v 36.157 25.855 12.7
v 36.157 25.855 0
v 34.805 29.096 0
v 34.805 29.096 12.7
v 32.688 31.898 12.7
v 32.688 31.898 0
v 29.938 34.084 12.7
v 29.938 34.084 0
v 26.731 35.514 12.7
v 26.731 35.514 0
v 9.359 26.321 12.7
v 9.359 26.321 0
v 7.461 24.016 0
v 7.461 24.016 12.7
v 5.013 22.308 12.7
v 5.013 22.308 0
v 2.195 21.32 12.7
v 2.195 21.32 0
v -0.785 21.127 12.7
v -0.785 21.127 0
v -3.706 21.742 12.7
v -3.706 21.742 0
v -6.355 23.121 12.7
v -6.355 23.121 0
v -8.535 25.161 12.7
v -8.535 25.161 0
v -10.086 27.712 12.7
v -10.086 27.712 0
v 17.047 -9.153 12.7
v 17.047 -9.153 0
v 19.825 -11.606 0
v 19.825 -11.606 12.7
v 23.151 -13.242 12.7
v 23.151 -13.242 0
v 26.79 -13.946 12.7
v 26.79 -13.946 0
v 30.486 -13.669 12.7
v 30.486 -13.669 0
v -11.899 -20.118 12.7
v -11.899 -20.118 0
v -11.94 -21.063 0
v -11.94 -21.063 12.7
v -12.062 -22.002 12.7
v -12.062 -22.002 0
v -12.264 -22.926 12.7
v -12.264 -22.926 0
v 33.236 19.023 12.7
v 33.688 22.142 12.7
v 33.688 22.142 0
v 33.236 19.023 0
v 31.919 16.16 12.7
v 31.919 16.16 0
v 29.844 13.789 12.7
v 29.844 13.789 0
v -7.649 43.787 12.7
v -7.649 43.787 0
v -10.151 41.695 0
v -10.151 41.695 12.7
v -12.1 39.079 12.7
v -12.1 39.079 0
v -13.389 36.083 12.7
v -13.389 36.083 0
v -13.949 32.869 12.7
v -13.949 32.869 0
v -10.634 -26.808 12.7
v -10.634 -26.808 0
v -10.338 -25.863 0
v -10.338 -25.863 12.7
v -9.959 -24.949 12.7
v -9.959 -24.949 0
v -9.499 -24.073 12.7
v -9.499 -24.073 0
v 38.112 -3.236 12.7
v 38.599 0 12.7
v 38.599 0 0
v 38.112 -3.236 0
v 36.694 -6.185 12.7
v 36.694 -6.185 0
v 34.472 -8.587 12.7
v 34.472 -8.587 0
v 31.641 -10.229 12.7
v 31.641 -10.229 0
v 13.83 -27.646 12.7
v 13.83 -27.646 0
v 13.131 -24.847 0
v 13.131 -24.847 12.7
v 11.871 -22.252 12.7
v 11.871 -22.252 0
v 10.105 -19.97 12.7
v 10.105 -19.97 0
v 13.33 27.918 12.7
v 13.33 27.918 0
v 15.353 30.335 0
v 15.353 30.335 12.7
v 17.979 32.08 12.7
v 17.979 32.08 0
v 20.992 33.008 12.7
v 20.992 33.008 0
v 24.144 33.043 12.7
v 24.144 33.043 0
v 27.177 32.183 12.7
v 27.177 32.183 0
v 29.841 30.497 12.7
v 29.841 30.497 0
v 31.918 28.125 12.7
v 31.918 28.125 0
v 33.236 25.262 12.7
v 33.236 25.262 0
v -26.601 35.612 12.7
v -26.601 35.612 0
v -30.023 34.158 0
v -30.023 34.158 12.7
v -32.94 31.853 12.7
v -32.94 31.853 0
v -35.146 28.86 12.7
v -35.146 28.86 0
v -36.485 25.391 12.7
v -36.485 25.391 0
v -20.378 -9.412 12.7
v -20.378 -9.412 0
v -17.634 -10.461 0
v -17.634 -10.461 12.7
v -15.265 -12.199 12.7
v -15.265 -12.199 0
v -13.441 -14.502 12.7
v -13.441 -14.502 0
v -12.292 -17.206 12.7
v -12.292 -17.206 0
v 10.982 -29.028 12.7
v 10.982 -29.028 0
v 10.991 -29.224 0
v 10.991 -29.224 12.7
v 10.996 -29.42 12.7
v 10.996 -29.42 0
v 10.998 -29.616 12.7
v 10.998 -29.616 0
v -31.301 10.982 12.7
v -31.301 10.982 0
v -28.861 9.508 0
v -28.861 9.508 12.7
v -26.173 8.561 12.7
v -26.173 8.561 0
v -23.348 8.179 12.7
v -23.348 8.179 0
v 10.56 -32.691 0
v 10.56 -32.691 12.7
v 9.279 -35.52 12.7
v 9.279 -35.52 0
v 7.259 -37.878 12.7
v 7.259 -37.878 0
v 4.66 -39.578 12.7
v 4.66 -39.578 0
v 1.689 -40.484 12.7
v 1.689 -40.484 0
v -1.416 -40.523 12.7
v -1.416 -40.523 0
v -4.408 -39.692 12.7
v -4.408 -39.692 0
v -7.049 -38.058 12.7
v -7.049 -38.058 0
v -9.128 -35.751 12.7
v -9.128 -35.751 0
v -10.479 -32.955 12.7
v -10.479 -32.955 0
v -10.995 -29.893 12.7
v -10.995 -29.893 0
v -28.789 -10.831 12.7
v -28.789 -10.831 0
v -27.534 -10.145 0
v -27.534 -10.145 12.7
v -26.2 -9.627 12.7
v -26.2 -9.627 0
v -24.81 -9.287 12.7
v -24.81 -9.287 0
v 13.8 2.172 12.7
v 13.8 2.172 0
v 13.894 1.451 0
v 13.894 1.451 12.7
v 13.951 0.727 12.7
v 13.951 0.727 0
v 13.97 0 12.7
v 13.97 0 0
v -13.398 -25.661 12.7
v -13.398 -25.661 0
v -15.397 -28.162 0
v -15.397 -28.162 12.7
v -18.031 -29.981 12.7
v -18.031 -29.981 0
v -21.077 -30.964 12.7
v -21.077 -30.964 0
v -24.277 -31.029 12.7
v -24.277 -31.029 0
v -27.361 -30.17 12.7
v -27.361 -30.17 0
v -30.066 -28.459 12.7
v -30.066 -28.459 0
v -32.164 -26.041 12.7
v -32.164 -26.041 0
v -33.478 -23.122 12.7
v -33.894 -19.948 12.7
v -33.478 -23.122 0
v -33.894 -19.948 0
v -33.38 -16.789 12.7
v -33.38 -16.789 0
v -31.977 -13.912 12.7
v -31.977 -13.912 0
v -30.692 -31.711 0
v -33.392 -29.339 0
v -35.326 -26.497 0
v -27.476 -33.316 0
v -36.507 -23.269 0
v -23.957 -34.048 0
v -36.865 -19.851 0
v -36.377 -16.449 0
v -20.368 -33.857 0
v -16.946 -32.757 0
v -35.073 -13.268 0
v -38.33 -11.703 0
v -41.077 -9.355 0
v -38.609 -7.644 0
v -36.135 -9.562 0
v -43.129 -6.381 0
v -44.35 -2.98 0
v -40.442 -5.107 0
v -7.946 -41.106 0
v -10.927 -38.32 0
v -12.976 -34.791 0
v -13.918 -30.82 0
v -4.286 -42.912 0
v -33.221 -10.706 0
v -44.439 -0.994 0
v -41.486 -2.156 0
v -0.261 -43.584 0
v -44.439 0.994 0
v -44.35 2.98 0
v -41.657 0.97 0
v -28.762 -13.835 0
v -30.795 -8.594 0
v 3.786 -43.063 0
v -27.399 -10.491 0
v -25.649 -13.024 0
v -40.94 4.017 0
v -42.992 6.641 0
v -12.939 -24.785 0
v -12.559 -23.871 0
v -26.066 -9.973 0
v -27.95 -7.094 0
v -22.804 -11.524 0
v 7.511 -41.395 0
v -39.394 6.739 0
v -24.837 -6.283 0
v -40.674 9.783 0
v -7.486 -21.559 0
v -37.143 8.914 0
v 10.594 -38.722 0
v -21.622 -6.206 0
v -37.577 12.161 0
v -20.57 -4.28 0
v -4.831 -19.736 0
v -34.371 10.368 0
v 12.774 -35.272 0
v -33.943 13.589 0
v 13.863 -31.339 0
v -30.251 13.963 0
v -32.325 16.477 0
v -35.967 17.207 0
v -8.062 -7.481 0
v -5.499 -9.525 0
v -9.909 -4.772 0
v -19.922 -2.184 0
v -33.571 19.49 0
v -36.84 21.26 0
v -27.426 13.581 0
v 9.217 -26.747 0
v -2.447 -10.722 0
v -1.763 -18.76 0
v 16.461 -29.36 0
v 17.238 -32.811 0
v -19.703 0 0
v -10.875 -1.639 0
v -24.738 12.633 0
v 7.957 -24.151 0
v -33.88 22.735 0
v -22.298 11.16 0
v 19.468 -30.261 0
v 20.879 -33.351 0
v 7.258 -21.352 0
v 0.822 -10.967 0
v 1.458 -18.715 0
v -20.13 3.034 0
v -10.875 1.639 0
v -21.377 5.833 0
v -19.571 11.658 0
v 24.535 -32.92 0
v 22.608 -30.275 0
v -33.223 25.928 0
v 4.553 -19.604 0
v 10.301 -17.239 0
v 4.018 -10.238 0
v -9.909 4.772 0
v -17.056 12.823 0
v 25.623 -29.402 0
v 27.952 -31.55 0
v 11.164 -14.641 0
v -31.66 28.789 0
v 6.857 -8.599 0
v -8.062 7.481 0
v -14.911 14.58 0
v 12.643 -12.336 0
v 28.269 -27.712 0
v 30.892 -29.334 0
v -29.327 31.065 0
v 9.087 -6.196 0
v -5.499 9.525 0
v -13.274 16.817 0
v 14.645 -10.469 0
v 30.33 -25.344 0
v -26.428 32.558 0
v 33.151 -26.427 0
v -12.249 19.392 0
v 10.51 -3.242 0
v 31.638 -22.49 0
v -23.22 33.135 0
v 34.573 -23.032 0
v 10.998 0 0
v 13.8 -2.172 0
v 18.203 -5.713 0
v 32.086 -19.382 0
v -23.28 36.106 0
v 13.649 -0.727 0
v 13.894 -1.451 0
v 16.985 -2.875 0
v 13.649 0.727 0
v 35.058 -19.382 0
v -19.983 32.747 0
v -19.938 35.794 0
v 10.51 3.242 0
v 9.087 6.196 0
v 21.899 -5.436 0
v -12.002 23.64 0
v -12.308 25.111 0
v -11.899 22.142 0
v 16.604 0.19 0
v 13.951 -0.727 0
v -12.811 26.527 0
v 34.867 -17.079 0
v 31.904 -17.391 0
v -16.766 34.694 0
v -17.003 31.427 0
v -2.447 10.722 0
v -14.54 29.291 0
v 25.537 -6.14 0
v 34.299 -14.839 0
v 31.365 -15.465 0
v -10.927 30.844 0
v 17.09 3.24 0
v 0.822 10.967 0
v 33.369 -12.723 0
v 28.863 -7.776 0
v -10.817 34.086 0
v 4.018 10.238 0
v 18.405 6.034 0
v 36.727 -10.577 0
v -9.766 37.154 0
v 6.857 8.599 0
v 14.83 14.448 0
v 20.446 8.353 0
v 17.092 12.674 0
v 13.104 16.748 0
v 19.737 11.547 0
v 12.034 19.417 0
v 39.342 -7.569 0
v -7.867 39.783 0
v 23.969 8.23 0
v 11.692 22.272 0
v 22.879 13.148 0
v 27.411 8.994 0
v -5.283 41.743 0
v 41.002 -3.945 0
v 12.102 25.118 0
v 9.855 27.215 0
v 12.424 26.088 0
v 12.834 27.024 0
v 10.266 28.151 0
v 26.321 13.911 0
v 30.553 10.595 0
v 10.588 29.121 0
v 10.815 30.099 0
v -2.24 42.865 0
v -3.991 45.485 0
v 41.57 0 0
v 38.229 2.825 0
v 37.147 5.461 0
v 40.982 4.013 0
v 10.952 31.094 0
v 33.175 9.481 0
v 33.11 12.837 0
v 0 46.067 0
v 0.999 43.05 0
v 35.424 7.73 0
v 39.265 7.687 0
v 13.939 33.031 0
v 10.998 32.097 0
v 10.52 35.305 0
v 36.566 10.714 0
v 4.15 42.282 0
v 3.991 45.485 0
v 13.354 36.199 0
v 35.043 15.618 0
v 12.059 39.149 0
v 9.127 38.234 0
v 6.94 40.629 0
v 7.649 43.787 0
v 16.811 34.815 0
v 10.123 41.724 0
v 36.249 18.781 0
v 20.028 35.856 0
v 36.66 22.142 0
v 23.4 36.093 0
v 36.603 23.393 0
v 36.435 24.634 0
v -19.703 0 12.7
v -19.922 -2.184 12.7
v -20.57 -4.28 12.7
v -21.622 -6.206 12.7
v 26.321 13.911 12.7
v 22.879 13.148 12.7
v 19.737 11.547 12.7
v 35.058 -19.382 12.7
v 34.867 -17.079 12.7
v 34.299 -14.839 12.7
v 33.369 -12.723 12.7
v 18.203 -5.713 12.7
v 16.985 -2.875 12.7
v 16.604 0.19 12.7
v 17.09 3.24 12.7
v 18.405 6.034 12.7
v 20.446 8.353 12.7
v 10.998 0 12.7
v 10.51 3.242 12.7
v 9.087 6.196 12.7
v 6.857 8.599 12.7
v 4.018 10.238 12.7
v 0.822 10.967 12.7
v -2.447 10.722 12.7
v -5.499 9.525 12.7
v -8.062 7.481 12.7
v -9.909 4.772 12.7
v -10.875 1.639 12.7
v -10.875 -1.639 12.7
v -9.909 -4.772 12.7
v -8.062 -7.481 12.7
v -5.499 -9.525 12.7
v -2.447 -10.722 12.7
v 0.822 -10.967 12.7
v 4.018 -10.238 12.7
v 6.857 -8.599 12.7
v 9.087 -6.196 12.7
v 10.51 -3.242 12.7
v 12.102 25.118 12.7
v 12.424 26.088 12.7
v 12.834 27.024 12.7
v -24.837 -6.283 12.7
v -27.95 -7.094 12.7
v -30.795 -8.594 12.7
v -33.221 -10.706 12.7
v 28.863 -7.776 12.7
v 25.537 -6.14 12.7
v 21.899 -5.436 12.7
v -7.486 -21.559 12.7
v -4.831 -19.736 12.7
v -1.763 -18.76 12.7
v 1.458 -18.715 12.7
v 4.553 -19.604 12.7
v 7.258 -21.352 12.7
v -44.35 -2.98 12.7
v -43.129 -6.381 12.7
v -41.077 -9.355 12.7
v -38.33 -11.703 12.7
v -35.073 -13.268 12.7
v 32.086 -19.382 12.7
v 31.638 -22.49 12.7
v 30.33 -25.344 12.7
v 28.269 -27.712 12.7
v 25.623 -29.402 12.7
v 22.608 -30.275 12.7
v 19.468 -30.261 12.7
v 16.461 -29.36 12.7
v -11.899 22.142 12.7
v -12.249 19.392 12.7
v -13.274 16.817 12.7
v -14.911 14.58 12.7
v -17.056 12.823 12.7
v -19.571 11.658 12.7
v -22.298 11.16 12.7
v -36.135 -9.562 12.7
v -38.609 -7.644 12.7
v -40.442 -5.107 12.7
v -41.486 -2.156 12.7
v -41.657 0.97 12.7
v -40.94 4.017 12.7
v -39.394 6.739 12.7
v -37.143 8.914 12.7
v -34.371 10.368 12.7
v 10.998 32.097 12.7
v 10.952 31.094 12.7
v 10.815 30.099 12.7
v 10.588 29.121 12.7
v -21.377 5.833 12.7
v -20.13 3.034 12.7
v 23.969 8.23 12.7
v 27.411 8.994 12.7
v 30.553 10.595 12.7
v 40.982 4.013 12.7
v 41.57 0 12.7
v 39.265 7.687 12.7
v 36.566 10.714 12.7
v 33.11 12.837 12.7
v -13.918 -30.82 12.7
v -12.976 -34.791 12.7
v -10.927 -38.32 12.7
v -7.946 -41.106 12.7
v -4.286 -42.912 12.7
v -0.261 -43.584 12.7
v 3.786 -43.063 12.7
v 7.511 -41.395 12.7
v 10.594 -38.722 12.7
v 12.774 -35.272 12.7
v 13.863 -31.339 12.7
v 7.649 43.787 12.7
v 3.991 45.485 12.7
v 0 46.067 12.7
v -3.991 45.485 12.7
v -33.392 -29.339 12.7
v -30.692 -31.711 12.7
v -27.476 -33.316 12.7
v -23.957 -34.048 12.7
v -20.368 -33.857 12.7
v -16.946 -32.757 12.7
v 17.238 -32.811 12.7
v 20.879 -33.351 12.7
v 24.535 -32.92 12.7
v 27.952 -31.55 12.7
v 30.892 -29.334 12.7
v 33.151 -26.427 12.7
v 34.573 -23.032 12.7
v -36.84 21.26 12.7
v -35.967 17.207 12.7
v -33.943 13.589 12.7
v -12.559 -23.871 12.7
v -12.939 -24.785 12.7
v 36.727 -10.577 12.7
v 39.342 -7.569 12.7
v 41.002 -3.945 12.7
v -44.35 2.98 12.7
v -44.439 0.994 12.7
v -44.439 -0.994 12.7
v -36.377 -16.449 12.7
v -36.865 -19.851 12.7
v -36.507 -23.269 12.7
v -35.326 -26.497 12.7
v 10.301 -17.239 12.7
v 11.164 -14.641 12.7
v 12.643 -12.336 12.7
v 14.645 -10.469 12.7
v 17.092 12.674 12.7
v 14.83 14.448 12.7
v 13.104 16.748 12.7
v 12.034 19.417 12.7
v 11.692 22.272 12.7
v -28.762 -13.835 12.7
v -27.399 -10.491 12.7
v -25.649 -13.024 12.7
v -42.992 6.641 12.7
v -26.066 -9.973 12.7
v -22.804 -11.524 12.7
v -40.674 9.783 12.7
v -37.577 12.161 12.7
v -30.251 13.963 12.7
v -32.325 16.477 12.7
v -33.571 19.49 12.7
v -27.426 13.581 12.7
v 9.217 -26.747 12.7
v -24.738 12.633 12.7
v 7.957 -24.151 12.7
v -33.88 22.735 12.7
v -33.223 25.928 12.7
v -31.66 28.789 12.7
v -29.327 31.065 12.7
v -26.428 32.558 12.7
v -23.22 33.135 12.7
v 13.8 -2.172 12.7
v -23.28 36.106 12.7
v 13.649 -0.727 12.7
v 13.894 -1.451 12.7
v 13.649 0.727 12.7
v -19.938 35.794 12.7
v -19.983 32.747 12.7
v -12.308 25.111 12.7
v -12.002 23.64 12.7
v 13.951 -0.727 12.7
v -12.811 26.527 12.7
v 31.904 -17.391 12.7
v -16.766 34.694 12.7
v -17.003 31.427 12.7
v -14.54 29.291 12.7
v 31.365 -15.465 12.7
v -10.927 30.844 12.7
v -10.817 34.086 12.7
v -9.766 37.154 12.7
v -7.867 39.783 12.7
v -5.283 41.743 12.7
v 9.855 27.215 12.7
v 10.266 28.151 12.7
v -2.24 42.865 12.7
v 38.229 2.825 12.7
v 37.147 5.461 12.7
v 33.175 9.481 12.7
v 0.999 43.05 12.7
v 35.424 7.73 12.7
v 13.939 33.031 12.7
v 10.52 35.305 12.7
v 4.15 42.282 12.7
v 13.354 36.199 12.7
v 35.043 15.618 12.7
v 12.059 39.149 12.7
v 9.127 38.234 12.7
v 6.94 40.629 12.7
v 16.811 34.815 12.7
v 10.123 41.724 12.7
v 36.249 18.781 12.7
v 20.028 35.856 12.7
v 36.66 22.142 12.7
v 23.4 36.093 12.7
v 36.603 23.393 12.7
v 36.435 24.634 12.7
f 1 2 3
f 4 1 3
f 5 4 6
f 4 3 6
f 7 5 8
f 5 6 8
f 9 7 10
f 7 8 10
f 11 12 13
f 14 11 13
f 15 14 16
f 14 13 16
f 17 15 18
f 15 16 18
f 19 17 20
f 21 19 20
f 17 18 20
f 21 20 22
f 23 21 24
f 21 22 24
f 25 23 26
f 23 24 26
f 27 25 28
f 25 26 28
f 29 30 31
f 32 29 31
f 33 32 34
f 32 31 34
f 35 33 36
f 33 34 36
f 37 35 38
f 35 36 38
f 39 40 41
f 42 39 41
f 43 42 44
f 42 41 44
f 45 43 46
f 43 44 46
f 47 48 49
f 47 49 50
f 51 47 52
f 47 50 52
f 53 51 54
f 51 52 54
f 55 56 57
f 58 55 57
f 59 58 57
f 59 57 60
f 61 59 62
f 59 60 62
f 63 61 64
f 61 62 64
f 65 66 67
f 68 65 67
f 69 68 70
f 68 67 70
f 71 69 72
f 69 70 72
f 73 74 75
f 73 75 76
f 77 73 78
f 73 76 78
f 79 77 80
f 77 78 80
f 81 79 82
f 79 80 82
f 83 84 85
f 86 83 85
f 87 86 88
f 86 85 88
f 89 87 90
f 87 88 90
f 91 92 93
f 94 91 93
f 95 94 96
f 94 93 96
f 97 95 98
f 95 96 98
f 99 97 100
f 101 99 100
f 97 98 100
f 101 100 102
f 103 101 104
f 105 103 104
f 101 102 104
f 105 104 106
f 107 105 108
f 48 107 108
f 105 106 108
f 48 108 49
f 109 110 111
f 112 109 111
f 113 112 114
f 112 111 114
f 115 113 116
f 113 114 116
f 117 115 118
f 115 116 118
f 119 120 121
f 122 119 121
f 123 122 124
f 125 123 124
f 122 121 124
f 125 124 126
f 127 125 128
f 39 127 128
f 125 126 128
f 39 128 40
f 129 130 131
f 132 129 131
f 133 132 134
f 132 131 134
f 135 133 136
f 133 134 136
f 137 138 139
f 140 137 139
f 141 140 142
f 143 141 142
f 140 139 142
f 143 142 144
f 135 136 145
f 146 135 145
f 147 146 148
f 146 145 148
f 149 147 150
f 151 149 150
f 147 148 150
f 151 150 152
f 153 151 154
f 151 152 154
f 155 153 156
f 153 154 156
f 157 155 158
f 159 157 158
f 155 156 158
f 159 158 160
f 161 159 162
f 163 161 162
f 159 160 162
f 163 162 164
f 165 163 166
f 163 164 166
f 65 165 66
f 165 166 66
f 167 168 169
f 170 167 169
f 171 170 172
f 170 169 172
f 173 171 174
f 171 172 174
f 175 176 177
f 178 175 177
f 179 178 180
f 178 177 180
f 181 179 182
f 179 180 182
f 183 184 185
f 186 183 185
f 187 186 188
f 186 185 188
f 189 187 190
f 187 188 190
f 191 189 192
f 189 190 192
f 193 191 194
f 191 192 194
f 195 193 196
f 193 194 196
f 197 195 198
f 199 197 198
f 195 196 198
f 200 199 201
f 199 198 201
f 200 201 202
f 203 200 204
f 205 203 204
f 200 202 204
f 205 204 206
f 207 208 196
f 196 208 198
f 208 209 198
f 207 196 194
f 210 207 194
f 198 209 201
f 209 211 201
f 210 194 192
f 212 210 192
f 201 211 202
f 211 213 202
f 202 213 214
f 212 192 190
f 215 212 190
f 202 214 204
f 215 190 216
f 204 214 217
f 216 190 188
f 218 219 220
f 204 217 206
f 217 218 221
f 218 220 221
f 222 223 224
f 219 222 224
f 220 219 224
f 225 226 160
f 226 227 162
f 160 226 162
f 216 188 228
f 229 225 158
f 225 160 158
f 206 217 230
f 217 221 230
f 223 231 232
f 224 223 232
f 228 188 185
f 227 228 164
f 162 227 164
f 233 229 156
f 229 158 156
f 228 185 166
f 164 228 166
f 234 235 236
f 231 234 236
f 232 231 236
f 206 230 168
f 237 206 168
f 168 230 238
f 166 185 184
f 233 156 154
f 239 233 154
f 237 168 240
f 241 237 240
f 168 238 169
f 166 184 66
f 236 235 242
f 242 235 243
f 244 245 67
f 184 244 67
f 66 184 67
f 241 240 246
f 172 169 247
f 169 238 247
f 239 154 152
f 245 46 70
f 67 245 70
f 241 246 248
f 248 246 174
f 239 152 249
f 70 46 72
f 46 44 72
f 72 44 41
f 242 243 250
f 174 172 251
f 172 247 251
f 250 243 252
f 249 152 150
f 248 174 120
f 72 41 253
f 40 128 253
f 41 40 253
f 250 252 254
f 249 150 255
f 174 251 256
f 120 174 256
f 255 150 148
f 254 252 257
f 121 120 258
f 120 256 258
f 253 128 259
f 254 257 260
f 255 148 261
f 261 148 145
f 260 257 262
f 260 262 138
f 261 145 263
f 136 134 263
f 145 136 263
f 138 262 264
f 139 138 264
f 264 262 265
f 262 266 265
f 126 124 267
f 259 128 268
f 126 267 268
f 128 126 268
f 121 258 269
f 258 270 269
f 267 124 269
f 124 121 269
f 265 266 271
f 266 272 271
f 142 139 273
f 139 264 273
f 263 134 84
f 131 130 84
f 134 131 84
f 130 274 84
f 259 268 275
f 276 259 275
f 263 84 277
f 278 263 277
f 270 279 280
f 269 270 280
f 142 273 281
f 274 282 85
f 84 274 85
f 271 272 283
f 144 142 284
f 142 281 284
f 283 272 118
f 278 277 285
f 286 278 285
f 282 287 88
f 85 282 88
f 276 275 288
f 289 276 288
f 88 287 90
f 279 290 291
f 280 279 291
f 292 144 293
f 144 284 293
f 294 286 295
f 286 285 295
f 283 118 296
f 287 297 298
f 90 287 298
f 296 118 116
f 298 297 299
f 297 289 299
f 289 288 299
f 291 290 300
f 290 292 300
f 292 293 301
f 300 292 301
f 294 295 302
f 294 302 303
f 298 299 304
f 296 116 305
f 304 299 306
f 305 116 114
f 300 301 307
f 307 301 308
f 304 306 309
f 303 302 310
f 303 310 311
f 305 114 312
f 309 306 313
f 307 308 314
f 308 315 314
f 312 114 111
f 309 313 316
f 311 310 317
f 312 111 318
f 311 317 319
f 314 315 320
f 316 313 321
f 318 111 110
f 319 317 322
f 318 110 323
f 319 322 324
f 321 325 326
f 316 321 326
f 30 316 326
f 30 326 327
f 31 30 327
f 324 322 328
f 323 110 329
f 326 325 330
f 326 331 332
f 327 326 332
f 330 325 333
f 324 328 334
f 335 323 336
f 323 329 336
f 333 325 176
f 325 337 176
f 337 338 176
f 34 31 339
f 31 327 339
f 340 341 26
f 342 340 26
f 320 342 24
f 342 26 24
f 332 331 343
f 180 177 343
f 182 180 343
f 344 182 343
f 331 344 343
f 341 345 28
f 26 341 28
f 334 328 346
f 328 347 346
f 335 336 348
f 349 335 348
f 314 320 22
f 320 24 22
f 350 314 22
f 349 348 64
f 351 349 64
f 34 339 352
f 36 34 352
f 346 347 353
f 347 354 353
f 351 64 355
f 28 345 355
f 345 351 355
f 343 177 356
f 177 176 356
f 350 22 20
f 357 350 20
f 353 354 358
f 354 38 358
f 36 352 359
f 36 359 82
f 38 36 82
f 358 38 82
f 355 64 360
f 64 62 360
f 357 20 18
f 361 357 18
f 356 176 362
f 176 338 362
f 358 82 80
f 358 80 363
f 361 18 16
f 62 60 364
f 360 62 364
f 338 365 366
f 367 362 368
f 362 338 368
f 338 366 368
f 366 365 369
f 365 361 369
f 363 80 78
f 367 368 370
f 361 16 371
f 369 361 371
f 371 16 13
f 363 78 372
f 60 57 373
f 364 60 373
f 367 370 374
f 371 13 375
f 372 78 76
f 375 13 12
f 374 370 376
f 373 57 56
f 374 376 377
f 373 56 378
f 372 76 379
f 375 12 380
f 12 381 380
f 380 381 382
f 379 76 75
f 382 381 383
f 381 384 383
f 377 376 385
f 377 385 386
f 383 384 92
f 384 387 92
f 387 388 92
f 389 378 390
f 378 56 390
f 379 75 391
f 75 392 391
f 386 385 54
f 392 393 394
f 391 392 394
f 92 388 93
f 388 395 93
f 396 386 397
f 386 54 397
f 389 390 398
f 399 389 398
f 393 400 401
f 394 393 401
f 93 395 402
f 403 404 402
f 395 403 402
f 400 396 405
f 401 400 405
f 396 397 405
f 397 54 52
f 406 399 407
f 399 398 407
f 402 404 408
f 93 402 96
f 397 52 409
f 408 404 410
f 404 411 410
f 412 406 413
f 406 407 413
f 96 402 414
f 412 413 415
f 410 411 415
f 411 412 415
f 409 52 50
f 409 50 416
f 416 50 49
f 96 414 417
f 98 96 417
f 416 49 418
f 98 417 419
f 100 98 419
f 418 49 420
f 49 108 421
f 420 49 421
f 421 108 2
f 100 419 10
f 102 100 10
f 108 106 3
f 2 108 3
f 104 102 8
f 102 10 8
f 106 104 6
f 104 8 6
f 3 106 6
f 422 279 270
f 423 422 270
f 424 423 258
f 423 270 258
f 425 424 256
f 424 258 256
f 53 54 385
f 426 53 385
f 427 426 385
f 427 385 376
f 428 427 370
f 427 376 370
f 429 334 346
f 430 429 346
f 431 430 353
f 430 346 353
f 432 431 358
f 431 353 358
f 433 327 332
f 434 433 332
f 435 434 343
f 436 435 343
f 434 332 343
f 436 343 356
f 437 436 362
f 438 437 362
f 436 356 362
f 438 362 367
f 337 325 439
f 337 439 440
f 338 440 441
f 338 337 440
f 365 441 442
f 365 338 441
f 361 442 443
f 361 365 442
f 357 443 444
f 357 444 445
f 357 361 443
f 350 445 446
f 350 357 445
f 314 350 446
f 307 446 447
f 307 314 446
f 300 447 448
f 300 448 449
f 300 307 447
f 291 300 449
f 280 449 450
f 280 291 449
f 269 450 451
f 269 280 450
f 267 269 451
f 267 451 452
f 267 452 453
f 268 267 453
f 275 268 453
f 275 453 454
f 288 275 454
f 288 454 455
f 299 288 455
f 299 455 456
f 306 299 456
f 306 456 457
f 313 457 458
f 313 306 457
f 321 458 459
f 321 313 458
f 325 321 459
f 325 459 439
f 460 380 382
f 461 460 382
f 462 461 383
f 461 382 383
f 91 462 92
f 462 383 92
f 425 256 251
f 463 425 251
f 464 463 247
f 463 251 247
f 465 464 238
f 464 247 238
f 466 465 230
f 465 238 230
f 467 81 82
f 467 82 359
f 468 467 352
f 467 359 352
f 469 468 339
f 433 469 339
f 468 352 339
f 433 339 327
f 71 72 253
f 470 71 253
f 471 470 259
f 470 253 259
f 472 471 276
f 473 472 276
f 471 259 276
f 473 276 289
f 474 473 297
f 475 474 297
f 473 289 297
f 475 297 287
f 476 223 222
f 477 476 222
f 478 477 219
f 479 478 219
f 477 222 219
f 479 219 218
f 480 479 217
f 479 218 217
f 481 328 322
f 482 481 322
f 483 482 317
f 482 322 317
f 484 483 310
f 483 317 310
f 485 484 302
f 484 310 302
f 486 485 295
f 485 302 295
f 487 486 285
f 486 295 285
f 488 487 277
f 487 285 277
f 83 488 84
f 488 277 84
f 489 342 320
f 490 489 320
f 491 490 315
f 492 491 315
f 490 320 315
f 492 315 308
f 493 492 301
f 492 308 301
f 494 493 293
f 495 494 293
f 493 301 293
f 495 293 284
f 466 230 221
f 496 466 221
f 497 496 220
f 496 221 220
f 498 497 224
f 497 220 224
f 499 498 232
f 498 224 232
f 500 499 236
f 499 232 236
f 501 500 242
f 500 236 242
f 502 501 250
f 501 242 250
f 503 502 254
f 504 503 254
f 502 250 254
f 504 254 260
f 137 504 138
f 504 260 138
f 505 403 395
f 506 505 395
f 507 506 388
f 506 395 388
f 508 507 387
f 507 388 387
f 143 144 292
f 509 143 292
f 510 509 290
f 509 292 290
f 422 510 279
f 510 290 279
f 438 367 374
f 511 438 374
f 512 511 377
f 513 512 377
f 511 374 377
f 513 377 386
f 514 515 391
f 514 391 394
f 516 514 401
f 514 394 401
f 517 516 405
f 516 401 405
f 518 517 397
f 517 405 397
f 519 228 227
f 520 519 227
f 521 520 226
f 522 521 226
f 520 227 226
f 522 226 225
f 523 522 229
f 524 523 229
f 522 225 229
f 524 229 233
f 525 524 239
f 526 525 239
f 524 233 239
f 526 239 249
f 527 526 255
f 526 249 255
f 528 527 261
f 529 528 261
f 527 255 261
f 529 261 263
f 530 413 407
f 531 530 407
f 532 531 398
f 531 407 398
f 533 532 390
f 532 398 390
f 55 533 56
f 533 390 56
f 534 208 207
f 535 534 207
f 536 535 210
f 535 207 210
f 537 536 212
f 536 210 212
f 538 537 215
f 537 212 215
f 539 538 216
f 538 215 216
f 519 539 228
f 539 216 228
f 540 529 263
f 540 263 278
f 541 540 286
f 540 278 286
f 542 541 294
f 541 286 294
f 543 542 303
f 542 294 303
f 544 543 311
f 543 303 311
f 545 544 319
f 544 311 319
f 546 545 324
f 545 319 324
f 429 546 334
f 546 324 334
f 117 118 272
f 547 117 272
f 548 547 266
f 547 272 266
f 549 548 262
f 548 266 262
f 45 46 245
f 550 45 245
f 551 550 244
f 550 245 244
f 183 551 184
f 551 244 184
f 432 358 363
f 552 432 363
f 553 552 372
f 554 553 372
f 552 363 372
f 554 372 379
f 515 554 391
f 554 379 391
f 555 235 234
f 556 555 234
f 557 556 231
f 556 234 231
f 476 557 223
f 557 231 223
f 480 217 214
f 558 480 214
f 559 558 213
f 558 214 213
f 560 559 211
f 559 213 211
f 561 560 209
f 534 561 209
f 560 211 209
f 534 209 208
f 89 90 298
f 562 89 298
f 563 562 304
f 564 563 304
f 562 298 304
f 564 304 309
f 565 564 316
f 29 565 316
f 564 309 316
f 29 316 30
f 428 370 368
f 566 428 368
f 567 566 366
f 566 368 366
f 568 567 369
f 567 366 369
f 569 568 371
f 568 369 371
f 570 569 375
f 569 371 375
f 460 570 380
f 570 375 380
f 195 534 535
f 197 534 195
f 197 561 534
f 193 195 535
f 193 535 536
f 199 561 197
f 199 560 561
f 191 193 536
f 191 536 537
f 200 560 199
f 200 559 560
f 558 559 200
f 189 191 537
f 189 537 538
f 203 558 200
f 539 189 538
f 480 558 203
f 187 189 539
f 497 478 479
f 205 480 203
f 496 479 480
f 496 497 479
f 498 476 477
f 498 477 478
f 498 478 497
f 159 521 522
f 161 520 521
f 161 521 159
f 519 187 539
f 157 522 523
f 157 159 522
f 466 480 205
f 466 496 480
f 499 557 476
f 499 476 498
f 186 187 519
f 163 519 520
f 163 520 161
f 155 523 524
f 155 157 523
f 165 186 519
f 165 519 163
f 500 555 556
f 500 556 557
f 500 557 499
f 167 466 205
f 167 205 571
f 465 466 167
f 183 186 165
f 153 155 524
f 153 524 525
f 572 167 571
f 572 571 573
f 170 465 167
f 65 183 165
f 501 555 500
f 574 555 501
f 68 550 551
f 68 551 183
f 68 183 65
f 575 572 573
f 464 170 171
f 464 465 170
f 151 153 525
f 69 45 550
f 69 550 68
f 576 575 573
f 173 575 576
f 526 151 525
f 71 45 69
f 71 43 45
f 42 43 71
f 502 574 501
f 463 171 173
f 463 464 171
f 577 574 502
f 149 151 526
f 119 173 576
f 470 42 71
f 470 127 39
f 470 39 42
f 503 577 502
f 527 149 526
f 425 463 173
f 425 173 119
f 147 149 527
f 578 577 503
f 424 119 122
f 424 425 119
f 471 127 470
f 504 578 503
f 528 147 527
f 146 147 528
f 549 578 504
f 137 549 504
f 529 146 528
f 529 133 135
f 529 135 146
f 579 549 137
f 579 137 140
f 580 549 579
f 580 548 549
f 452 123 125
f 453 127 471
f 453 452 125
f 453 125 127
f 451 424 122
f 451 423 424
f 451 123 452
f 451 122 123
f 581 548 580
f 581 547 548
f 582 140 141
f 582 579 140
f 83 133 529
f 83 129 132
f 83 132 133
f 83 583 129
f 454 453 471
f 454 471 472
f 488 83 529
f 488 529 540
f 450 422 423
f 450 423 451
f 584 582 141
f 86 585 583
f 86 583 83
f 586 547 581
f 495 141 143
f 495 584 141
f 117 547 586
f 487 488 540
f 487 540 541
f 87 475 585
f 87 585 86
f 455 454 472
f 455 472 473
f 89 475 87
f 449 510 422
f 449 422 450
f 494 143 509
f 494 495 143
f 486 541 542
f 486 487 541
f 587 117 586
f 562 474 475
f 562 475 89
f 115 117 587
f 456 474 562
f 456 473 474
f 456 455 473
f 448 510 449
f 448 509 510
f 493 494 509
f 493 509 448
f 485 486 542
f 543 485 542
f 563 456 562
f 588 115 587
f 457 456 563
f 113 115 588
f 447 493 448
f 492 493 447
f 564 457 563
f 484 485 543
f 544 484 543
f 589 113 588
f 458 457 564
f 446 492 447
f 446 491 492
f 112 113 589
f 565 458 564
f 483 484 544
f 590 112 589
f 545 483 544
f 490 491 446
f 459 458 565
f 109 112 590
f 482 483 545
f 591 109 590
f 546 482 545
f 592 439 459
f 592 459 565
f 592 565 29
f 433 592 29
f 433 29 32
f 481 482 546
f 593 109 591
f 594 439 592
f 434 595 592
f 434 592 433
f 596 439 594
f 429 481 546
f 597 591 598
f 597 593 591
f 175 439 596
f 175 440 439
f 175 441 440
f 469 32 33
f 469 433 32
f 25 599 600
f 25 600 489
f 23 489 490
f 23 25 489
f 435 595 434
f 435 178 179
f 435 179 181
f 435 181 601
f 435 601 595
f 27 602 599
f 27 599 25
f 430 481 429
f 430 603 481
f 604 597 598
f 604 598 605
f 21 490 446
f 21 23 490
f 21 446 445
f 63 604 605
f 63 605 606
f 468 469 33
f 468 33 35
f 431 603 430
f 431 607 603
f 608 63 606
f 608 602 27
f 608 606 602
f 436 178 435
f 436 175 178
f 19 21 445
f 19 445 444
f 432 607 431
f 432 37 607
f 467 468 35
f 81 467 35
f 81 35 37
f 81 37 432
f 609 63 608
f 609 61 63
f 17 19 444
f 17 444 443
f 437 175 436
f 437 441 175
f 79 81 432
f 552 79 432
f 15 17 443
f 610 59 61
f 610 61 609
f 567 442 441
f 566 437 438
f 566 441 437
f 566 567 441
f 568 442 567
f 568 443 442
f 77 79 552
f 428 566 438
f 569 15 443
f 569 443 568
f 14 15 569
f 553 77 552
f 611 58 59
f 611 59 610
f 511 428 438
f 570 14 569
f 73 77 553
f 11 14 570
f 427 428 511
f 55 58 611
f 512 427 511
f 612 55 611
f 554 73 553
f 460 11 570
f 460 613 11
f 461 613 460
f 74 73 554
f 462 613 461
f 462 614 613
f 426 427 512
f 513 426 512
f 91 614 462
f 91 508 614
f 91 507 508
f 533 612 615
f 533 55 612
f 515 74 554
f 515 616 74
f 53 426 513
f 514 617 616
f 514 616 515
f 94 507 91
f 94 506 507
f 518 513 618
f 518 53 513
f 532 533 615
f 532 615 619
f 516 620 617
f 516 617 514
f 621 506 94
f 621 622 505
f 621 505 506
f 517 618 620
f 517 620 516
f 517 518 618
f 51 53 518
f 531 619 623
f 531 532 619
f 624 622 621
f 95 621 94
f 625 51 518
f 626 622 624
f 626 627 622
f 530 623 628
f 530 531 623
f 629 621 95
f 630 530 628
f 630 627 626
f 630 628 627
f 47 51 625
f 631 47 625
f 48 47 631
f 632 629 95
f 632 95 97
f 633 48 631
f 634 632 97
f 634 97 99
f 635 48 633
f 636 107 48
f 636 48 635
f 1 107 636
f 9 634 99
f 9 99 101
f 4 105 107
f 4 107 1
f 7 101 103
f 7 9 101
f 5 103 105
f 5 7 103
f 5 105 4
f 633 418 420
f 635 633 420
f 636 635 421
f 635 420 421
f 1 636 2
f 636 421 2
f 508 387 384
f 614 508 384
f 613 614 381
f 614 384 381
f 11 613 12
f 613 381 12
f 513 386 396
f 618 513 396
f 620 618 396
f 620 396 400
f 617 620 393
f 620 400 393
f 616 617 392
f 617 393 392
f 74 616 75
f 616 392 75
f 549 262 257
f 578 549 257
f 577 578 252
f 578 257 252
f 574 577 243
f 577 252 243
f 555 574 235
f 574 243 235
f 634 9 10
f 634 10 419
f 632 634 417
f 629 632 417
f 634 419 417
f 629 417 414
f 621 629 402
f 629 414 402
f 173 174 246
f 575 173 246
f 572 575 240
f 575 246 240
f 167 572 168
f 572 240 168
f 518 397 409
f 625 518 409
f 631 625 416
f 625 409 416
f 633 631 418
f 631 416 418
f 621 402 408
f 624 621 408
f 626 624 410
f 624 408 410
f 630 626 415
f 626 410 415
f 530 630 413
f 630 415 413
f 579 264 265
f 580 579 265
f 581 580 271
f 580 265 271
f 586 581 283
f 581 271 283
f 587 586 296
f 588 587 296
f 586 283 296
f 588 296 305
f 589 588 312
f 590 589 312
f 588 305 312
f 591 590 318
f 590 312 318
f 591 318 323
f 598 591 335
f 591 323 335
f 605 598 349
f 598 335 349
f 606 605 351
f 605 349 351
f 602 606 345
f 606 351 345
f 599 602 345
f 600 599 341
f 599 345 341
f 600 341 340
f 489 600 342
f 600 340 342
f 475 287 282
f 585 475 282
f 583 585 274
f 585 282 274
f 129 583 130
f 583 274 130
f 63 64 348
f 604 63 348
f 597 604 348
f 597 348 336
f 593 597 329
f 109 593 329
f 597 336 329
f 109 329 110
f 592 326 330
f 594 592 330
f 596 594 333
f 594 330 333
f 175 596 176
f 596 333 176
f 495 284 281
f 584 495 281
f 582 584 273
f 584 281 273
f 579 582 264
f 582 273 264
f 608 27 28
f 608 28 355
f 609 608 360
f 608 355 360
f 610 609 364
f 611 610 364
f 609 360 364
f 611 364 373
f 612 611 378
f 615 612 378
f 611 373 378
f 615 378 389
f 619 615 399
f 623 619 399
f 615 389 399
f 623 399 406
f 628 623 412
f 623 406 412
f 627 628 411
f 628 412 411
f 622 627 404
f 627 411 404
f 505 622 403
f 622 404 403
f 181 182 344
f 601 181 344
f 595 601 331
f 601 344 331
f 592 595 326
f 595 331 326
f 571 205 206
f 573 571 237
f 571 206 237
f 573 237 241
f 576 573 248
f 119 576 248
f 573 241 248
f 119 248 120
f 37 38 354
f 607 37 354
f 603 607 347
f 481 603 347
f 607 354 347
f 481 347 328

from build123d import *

# Parameters (mm, degrees)
F0_R     = 10.9982
F1_DEPTH = 12.7


with BuildPart() as f1:
    # F0 (on Top) → F1 (new body)
    with BuildSketch(Plane.XY):
        with BuildLine():
            ThreePointArc((36.6595053904, 22.1415615255), (36.5332921925, 24.0151855477), (36.1569331676, 25.8549547266))
            ThreePointArc((36.1569331676, 25.8549547266), (31.8126817374, 31.044416256), (26.7309490751, 35.514206475))
            ThreePointArc((26.7309490751, 35.514206475), (20.0275986163, 35.8556109759), (13.9387298404, 33.0312276028))
            ThreePointArc((13.9387298404, 33.0312276028), (13.9621802716, 32.5643943457), (13.97, 32.0970378816))
            ThreePointArc((13.97, 32.0970378816), (13.809120306, 29.9830141416), (13.3301866323, 27.9176809516))
            ThreePointArc((13.3301866323, 27.9176809516), (25.6915666552, 32.7221111995), (33.6877053904, 22.1415615255))
            ThreePointArc((33.6877053904, 22.1415615255), (32.6807162633, 17.5441591575), (29.8441476203, 13.7886280407))
            ThreePointArc((29.8441476203, 13.7886280407), (31.5063251421, 13.4128387201), (33.1103805724, 12.8374624052))
            ThreePointArc((33.1103805724, 12.8374624052), (35.7421014213, 17.1625418576), (36.6595053904, 22.1415615255))
        make_face()
        with BuildLine():
            ThreePointArc((26.7309490751, 35.514206475), (31.8126817374, 31.044416256), (36.1569331676, 25.8549547266))
            ThreePointArc((36.1569331676, 25.8549547266), (32.6877767936, 31.8983780631), (26.7309490751, 35.514206475))
        make_face()
        with BuildLine():
            ThreePointArc((-35.0731566807, -13.2683694138), (-36.7917944171, -21.5711650181), (-33.3923149137, -29.3386401304))
            ThreePointArc((-33.3923149137, -29.3386401304), (-23.9570048726, -34.0476963086), (-13.9180516707, -30.8197396373))
            ThreePointArc((-13.9180516707, -30.8197396373), (-13.8996752079, -28.2161297549), (-13.3984786946, -25.661149487))
            ThreePointArc((-13.3984786946, -25.661149487), (-28.776093154, -29.4132769471), (-31.9773540352, -13.9116184645))
            ThreePointArc((-31.9773540352, -13.9116184645), (-33.5435128628, -13.6778629095), (-35.0731566807, -13.2683694138))
        make_face()
        with BuildLine():
            ThreePointArc((-44.3500050785, 2.9798573019), (-44.45, 0), (-44.3500050785, -2.9798573019))
            ThreePointArc((-44.3500050785, -2.9798573019), (-41.0767090039, -9.3550091876), (-35.0731566807, -13.2683694138))
            ThreePointArc((-35.0731566807, -13.2683694138), (-34.2197857507, -11.9344829162), (-33.2209432758, -10.7057401266))
            ThreePointArc((-33.2209432758, -10.7057401266), (-41.6568779936, 0.9697265091), (-31.3012430481, 10.9818362069))
            ThreePointArc((-31.3012430481, 10.9818362069), (-32.7092505873, 12.1971076688), (-33.9433392044, 13.5886518621))
            ThreePointArc((-33.9433392044, 13.5886518621), (-40.6743431807, 9.7828190024), (-44.3500050785, 2.9798573019))
        make_face()
        with BuildLine():
            ThreePointArc((-33.2209432758, -10.7057401266), (-34.2197857507, -11.9344829162), (-35.0731566807, -13.2683694138))
            ThreePointArc((-35.0731566807, -13.2683694138), (-33.5435128628, -13.6778629095), (-31.9773540352, -13.9116184645))
            ThreePointArc((-31.9773540352, -13.9116184645), (-30.5399313145, -12.2087541474), (-28.7887583748, -10.8305943977))
            ThreePointArc((-28.7887583748, -10.8305943977), (-31.0112079738, -10.9938388171), (-33.2209432758, -10.7057401266))
        make_face()
        with BuildLine():
            ThreePointArc((-13.3984786946, -25.661149487), (-13.8996752079, -28.2161297549), (-13.9180516707, -30.8197396373))
            ThreePointArc((-13.9180516707, -30.8197396373), (-12.0881248548, -28.9675814469), (-10.6336762496, -26.8080209895))
            ThreePointArc((-10.6336762496, -26.8080209895), (-10.15886339, -25.4020923525), (-9.4991085531, -24.0728797514))
            ThreePointArc((-9.4991085531, -24.0728797514), (-9.0712058092, -22.1159428971), (-8.9275872476, -20.1179247995))
            ThreePointArc((-8.9275872476, -20.1179247995), (-8.9405803722, -19.5155469447), (-8.9795355769, -18.9142896011))
            ThreePointArc((-8.9795355769, -18.9142896011), (-10.8094623929, -20.7664477915), (-12.2639109981, -22.9260082489))
            ThreePointArc((-12.2639109981, -22.9260082489), (-12.7387238577, -24.3319368858), (-13.3984786946, -25.661149487))
        make_face()
        with BuildLine():
            ThreePointArc((-10.6336762496, -26.8080209895), (-12.0881248548, -28.9675814469), (-13.9180516707, -30.8197396373))
            ThreePointArc((-13.9180516707, -30.8197396373), (-0.2611307533, -43.5836636648), (13.8633362869, -31.3391270727))
            ThreePointArc((13.8633362869, -31.3391270727), (12.3461913769, -30.279208289), (10.9824672855, -29.0280435884))
            ThreePointArc((10.9824672855, -29.0280435884), (10.9942661178, -29.321968806), (10.9982, -29.6161044389))
            ThreePointArc((10.9982, -29.6161044389), (-1.415822219, -40.5227927852), (-10.6336762496, -26.8080209895))
        make_face()
        with BuildLine():
            ThreePointArc((13.9387298404, 33.0312276028), (12.059390514, 39.1491298005), (7.6490093808, 43.7869290484))
            ThreePointArc((7.6490093808, 43.7869290484), (0, 44.45), (-7.6490093808, 43.7869290484))
            ThreePointArc((-7.6490093808, 43.7869290484), (-12.1002142351, 39.0788510748), (-13.9486559845, 32.8689810311))
            ThreePointArc((-13.9486559845, 32.8689810311), (-11.7159971411, 30.5161028675), (-10.0861193168, 27.7117670386))
            ThreePointArc((-10.0861193168, 27.7117670386), (-2.2395586362, 42.8648036831), (10.9982, 32.0970378816))
            ThreePointArc((10.9982, 32.0970378816), (10.8951364792, 30.594904619), (10.587877522, 29.1209241709))
            ThreePointArc((10.587877522, 29.1209241709), (12.0815696669, 31.2318090297), (13.9387298404, 33.0312276028))
        make_face()
        with BuildLine():
            ThreePointArc((-7.6490093808, 43.7869290484), (0, 44.45), (7.6490093808, 43.7869290484))
            ThreePointArc((7.6490093808, 43.7869290484), (0, 46.0670378816), (-7.6490093808, 43.7869290484))
        make_face()
        with BuildLine():
            ThreePointArc((13.97, 32.0970378816), (13.9621802716, 32.5643943457), (13.9387298404, 33.0312276028))
            ThreePointArc((13.9387298404, 33.0312276028), (12.0815696669, 31.2318090297), (10.587877522, 29.1209241709))
            ThreePointArc((10.587877522, 29.1209241709), (10.0713786475, 27.678018151), (9.3593187581, 26.3209184555))
            ThreePointArc((9.3593187581, 26.3209184555), (8.8173915919, 23.7924275898), (8.7507755499, 21.2073718043))
            ThreePointArc((8.7507755499, 21.2073718043), (10.6079357234, 23.0067903774), (12.1016278684, 25.1176752363))
            ThreePointArc((12.1016278684, 25.1176752363), (12.6181267429, 26.5605812561), (13.3301866323, 27.9176809516))
            ThreePointArc((13.3301866323, 27.9176809516), (13.809120306, 29.9830141416), (13.97, 32.0970378816))
        make_face()
        with BuildLine():
            ThreePointArc((30.5525684391, 10.5945645354), (31.9000019579, 11.6378644155), (33.1103805724, 12.8374624052))
            ThreePointArc((33.1103805724, 12.8374624052), (31.5063251421, 13.4128387201), (29.8441476203, 13.7886280407))
            ThreePointArc((29.8441476203, 13.7886280407), (25.0709576069, 11.4042858664), (19.737284947, 11.5469969902))
            ThreePointArc((19.737284947, 11.5469969902), (18.3898514282, 10.5036971101), (17.1794728138, 9.3040991203))
            ThreePointArc((17.1794728138, 9.3040991203), (18.7835282441, 8.7287228054), (20.4457057658, 8.3529334848))
            ThreePointArc((20.4457057658, 8.3529334848), (25.2188957792, 10.7372756591), (30.5525684391, 10.5945645354))
        make_face()
        with BuildLine():
            ThreePointArc((41.5703479958, 0), (39.2651680779, 7.6871888524), (33.1103805724, 12.8374624052))
            ThreePointArc((33.1103805724, 12.8374624052), (31.9000019579, 11.6378644155), (30.5525684391, 10.5945645354))
            ThreePointArc((30.5525684391, 10.5945645354), (36.3590440779, 6.6517400866), (38.5985479958, 0))
            ThreePointArc((38.5985479958, 0), (36.6944361636, -6.1853022267), (31.6414161677, -10.2288890535))
            ThreePointArc((31.6414161677, -10.2288890535), (32.5730438121, -11.4291217528), (33.3688178772, -12.7234293815))
            ThreePointArc((33.3688178772, -12.7234293815), (39.3422904297, -7.5688630506), (41.5703479958, 0))
        make_face()
        with BuildLine():
            ThreePointArc((-28.7887583748, -10.8305943977), (-30.5399313145, -12.2087541474), (-31.9773540352, -13.9116184645))
            ThreePointArc((-31.9773540352, -13.9116184645), (-25.6492253052, -13.0244114798), (-20.3781564427, -9.4121846728))
            ThreePointArc((-20.3781564427, -9.4121846728), (-22.5878917447, -9.1240859824), (-24.8103413437, -9.2873304017))
            ThreePointArc((-24.8103413437, -9.2873304017), (-26.7239845749, -10.2537639468), (-28.7887583748, -10.8305943977))
        make_face()
        with BuildLine():
            ThreePointArc((-21.6217456833, -6.2063063349), (-27.9498744133, -7.0935133196), (-33.2209432758, -10.7057401266))
            ThreePointArc((-33.2209432758, -10.7057401266), (-31.0112079738, -10.9938388171), (-28.7887583748, -10.8305943977))
            ThreePointArc((-28.7887583748, -10.8305943977), (-26.8751151435, -9.8641608526), (-24.8103413437, -9.2873304017))
            ThreePointArc((-24.8103413437, -9.2873304017), (-23.059168404, -7.9091706521), (-21.6217456833, -6.2063063349))
        make_face()
        with BuildLine():
            ThreePointArc((10.9824672855, -29.0280435884), (12.3461913769, -30.279208289), (13.8633362869, -31.3391270727))
            ThreePointArc((13.8633362869, -31.3391270727), (13.9433085731, -30.4792649315), (13.97, -29.6161044389))
            ThreePointArc((13.97, -29.6161044389), (13.9350517356, -28.628565515), (13.8303818001, -27.6459675748))
            ThreePointArc((13.8303818001, -27.6459675748), (11.1933031436, -24.1840608478), (10.1054399692, -19.9703290409))
            ThreePointArc((10.1054399692, -19.9703290409), (8.7417158778, -18.7191643403), (7.2245709678, -17.6592455566))
            ThreePointArc((7.2245709678, -17.6592455566), (7.118463381, -19.5069191441), (7.2575254546, -21.3524050545))
            ThreePointArc((7.2575254546, -21.3524050545), (9.8946041111, -24.8143117814), (10.9824672855, -29.0280435884))
        make_face()
        with BuildLine():
            ThreePointArc((13.97, -29.6161044389), (13.9433085731, -30.4792649315), (13.8633362869, -31.3391270727))
            ThreePointArc((13.8633362869, -31.3391270727), (27.952076672, -31.5496047194), (35.0579072547, -19.3822681904))
            ThreePointArc((35.0579072547, -19.3822681904), (34.6290523576, -15.9474043937), (33.3688178772, -12.7234293815))
            ThreePointArc((33.3688178772, -12.7234293815), (31.9529542163, -13.2746268908), (30.4856051307, -13.6688035784))
            ThreePointArc((30.4856051307, -13.6688035784), (31.6784257505, -16.4155661106), (32.0861072547, -19.3822681904))
            ThreePointArc((32.0861072547, -19.3822681904), (25.6233612995, -29.4017522014), (13.8303818001, -27.6459675748))
            ThreePointArc((13.8303818001, -27.6459675748), (13.9350517356, -28.628565515), (13.97, -29.6161044389))
        make_face()
        with BuildLine():
            ThreePointArc((19.737284947, 11.5469969902), (25.0709576069, 11.4042858664), (29.8441476203, 13.7886280407))
            ThreePointArc((29.8441476203, 13.7886280407), (24.5754086907, 13.6385718534), (19.737284947, 11.5469969902))
        make_face()
        with BuildLine():
            ThreePointArc((20.4457057658, 8.3529334848), (25.7144446954, 8.5029896721), (30.5525684391, 10.5945645354))
            ThreePointArc((30.5525684391, 10.5945645354), (25.2188957792, 10.7372756591), (20.4457057658, 8.3529334848))
        make_face()
        with BuildLine():
            ThreePointArc((-26.6008057499, 35.6117906522), (-32.9402707471, 31.8526586896), (-36.4845167296, 25.390599422))
            ThreePointArc((-36.4845167296, 25.390599422), (-31.9539929528, 30.898945522), (-26.6008057499, 35.6117906522))
        make_face()
        with BuildLine():
            ThreePointArc((-26.6008057499, 35.6117906522), (-31.9539929528, 30.898945522), (-36.4845167296, 25.390599422))
            ThreePointArc((-36.4845167296, 25.390599422), (-36.554590589, 19.200956191), (-33.9433392044, 13.5886518621))
            ThreePointArc((-33.9433392044, 13.5886518621), (-32.1094541548, 13.8988704654), (-30.2506123073, 13.9627214053))
            ThreePointArc((-30.2506123073, 13.9627214053), (-29.326558574, 31.0650547274), (-12.8114679451, 26.5268324014))
            ThreePointArc((-12.8114679451, 26.5268324014), (-13.7507007273, 29.6314488023), (-13.9486559845, 32.8689810311))
            ThreePointArc((-13.9486559845, 32.8689810311), (-19.9378361185, 35.7944283766), (-26.6008057499, 35.6117906522))
        make_face()
        with BuildLine():
            ThreePointArc((-30.2506123073, 13.9627214053), (-32.1094541548, 13.8988704654), (-33.9433392044, 13.5886518621))
            ThreePointArc((-33.9433392044, 13.5886518621), (-32.7092505873, 12.1971076688), (-31.3012430481, 10.9818362069))
            ThreePointArc((-31.3012430481, 10.9818362069), (-27.0455661697, 10.3727749365), (-23.3484874112, 8.1788401202))
            ThreePointArc((-23.3484874112, 8.1788401202), (-21.4896455636, 8.2426910601), (-19.6557605141, 8.5529096634))
            ThreePointArc((-19.6557605141, 8.5529096634), (-20.8898491312, 9.9444538567), (-22.2978566704, 11.1597253186))
            ThreePointArc((-22.2978566704, 11.1597253186), (-26.5535335488, 11.768786589), (-30.2506123073, 13.9627214053))
        make_face()
        with BuildLine():
            ThreePointArc((-18.5259430378, -6.8495553856), (-19.3793139677, -8.1834418832), (-20.3781564427, -9.4121846728))
            ThreePointArc((-20.3781564427, -9.4121846728), (-14.2758238805, -13.289630746), (-11.8993872476, -20.1179247995))
            ThreePointArc((-11.8993872476, -20.1179247995), (-11.9908989013, -21.5337470185), (-12.2639109981, -22.9260082489))
            ThreePointArc((-12.2639109981, -22.9260082489), (-10.8094623929, -20.7664477915), (-8.9795355769, -18.9142896011))
            ThreePointArc((-8.9795355769, -18.9142896011), (-11.9423283838, -11.4494068623), (-18.5259430378, -6.8495553856))
        make_face()
        with BuildLine():
            ThreePointArc((-24.8103413437, -9.2873304017), (-22.5878917447, -9.1240859824), (-20.3781564427, -9.4121846728))
            ThreePointArc((-20.3781564427, -9.4121846728), (-19.3793139677, -8.1834418832), (-18.5259430378, -6.8495553856))
            ThreePointArc((-18.5259430378, -6.8495553856), (-20.0555868557, -6.4400618899), (-21.6217456833, -6.2063063349))
            ThreePointArc((-21.6217456833, -6.2063063349), (-23.059168404, -7.9091706521), (-24.8103413437, -9.2873304017))
        make_face()
        with BuildLine():
            ThreePointArc((-23.3484874112, 8.1788401202), (-27.0455661697, 10.3727749365), (-31.3012430481, 10.9818362069))
            ThreePointArc((-31.3012430481, 10.9818362069), (-27.5413989466, 8.9659813522), (-23.3484874112, 8.1788401202))
        make_face()
        with BuildLine():
            ThreePointArc((-19.7033124708, 0), (-20.1938606322, -3.248023411), (-21.6217456833, -6.2063063349))
            ThreePointArc((-21.6217456833, -6.2063063349), (-20.0555868557, -6.4400618899), (-18.5259430378, -6.8495553856))
            ThreePointArc((-18.5259430378, -6.8495553856), (-17.187564029, -3.5403527381), (-16.7315124708, 0))
            ThreePointArc((-16.7315124708, 0), (-17.4827747316, 4.5194991517), (-19.6557605141, 8.5529096634))
            ThreePointArc((-19.6557605141, 8.5529096634), (-21.4896455636, 8.2426910601), (-23.3484874112, 8.1788401202))
            ThreePointArc((-23.3484874112, 8.1788401202), (-20.655855612, 4.4771845522), (-19.7033124708, 0))
        make_face()
        with BuildLine():
            ThreePointArc((-8.9275872476, -20.1179247995), (-9.0712058092, -22.1159428971), (-9.4991085531, -24.0728797514))
            ThreePointArc((-9.4991085531, -24.0728797514), (-1.7625037137, -18.760046964), (7.2575254546, -21.3524050545))
            ThreePointArc((7.2575254546, -21.3524050545), (7.118463381, -19.5069191441), (7.2245709678, -17.6592455566))
            ThreePointArc((7.2245709678, -17.6592455566), (-1.0787766605, -15.6878187972), (-8.9795355769, -18.9142896011))
            ThreePointArc((-8.9795355769, -18.9142896011), (-8.9405803722, -19.5155469447), (-8.9275872476, -20.1179247995))
        make_face()
        with BuildLine():
            ThreePointArc((7.2575254546, -21.3524050545), (8.5197034185, -25.4815429285), (10.9824672855, -29.0280435884))
            ThreePointArc((10.9824672855, -29.0280435884), (9.8946041111, -24.8143117814), (7.2575254546, -21.3524050545))
        make_face()
        with BuildLine():
            ThreePointArc((-10.0861193168, 27.7117670386), (-11.7159971411, 30.5161028675), (-13.9486559845, 32.8689810311))
            ThreePointArc((-13.9486559845, 32.8689810311), (-13.7507007273, 29.6314488023), (-12.8114679451, 26.5268324014))
            ThreePointArc((-12.8114679451, 26.5268324014), (-11.1815901173, 23.7224965539), (-8.9489312631, 21.3696183761))
            ThreePointArc((-8.9489312631, 21.3696183761), (-8.932924271, 21.75544244), (-8.9275872476, 22.1415615255))
            ThreePointArc((-8.9275872476, 22.1415615255), (-9.2202865821, 24.9862665196), (-10.0861193168, 27.7117670386))
        make_face()
        with BuildLine():
            ThreePointArc((8.7507755499, 21.2073718043), (8.8173915919, 23.7924275898), (9.3593187581, 26.3209184555))
            ThreePointArc((9.3593187581, 26.3209184555), (-0.7846494175, 21.1268633829), (-10.0861193168, 27.7117670386))
            ThreePointArc((-10.0861193168, 27.7117670386), (-9.2202865821, 24.9862665196), (-8.9275872476, 22.1415615255))
            ThreePointArc((-8.9275872476, 22.1415615255), (-8.932924271, 21.75544244), (-8.9489312631, 21.3696183761))
            ThreePointArc((-8.9489312631, 21.3696183761), (-6.6028466768, 19.7859324981), (-3.9856875286, 18.707669154))
            ThreePointArc((-3.9856875286, 18.707669154), (2.6904728762, 18.3885640168), (8.7507755499, 21.2073718043))
        make_face()
        with BuildLine():
            ThreePointArc((30.4856051307, -13.6688035784), (31.9529542163, -13.2746268908), (33.3688178772, -12.7234293815))
            ThreePointArc((33.3688178772, -12.7234293815), (32.5730438121, -11.4291217528), (31.6414161677, -10.2288890535))
            ThreePointArc((31.6414161677, -10.2288890535), (29.9449474712, -10.7453830336), (28.1875230343, -10.9825146808))
            ThreePointArc((28.1875230343, -10.9825146808), (29.4452020606, -12.2327208784), (30.4856051307, -13.6688035784))
        make_face()
        with BuildLine():
            ThreePointArc((17.1794728138, 9.3040991203), (18.3898514282, 10.5036971101), (19.737284947, 11.5469969902))
            ThreePointArc((19.737284947, 11.5469969902), (13.1043924415, 16.7484165249), (12.1016278684, 25.1176752363))
            ThreePointArc((12.1016278684, 25.1176752363), (10.6079357234, 23.0067903774), (8.7507755499, 21.2073718043))
            ThreePointArc((8.7507755499, 21.2073718043), (11.288384172, 14.0684372874), (17.1794728138, 9.3040991203))
        make_face()
        with BuildLine():
            ThreePointArc((18.2026501198, -5.713464612), (16.7393683162, 1.731913289), (20.4457057658, 8.3529334848))
            ThreePointArc((20.4457057658, 8.3529334848), (18.7835282441, 8.7287228054), (17.1794728138, 9.3040991203))
            ThreePointArc((17.1794728138, 9.3040991203), (14.9756604504, 5.9814851318), (13.8001739979, 2.1716578064))
            ThreePointArc((13.8001739979, 2.1716578064), (13.9274787875, 1.0891439872), (13.97, 0))
            ThreePointArc((13.97, 0), (13.9274787875, -1.0891439872), (13.8001739979, -2.1716578064))
            ThreePointArc((13.8001739979, -2.1716578064), (14.3682112794, -4.4801180698), (15.3194373733, -6.6588388088))
            ThreePointArc((15.3194373733, -6.6588388088), (16.7353010341, -6.1076412996), (18.2026501198, -5.713464612))
        make_face()
        with BuildLine():
            ThreePointArc((-22.2978566704, 11.1597253186), (-26.0577007719, 13.1755801734), (-30.2506123073, 13.9627214053))
            ThreePointArc((-30.2506123073, 13.9627214053), (-26.5535335488, 11.768786589), (-22.2978566704, 11.1597253186))
        make_face()
        with BuildLine():
            ThreePointArc((-16.7315124708, 0), (-17.187564029, -3.5403527381), (-18.5259430378, -6.8495553856))
            ThreePointArc((-18.5259430378, -6.8495553856), (-11.9423283838, -11.4494068623), (-8.9795355769, -18.9142896011))
            ThreePointArc((-8.9795355769, -18.9142896011), (-1.0787766605, -15.6878187972), (7.2245709678, -17.6592455566))
            ThreePointArc((7.2245709678, -17.6592455566), (9.8360544956, -11.1023702751), (15.3194373733, -6.6588388088))
            ThreePointArc((15.3194373733, -6.6588388088), (14.3682112794, -4.4801180698), (13.8001739979, -2.1716578064))
            ThreePointArc((13.8001739979, -2.1716578064), (-10.6183557945, -9.0780735964), (0, 13.97))
            ThreePointArc((0, 13.97), (-1.8737816141, 16.4389987108), (-3.9856875286, 18.707669154))
            ThreePointArc((-3.9856875286, 18.707669154), (-6.6028466768, 19.7859324981), (-8.9489312631, 21.3696183761))
            ThreePointArc((-8.9489312631, 21.3696183761), (-12.176338273, 13.1852385957), (-19.6557605141, 8.5529096634))
            ThreePointArc((-19.6557605141, 8.5529096634), (-17.4827747316, 4.5194991517), (-16.7315124708, 0))
        make_face()
        with BuildLine():
            ThreePointArc((10.1054399692, -19.9703290409), (11.1933031436, -24.1840608478), (13.8303818001, -27.6459675748))
            ThreePointArc((13.8303818001, -27.6459675748), (12.5682038362, -23.5168297008), (10.1054399692, -19.9703290409))
        make_face()
        with BuildLine():
            ThreePointArc((-8.9489312631, 21.3696183761), (-11.1815901173, 23.7224965539), (-12.8114679451, 26.5268324014))
            ThreePointArc((-12.8114679451, 26.5268324014), (-12.1298214498, 24.3811201792), (-11.8993872476, 22.1415615255))
            ThreePointArc((-11.8993872476, 22.1415615255), (-14.9114630289, 14.5796686935), (-22.2978566704, 11.1597253186))
            ThreePointArc((-22.2978566704, 11.1597253186), (-20.8898491312, 9.9444538567), (-19.6557605141, 8.5529096634))
            ThreePointArc((-19.6557605141, 8.5529096634), (-12.176338273, 13.1852385957), (-8.9489312631, 21.3696183761))
        make_face()
        with BuildLine():
            ThreePointArc((17.1794728138, 9.3040991203), (11.288384172, 14.0684372874), (8.7507755499, 21.2073718043))
            ThreePointArc((8.7507755499, 21.2073718043), (2.6904728762, 18.3885640168), (-3.9856875286, 18.707669154))
            ThreePointArc((-3.9856875286, 18.707669154), (-1.8737816141, 16.4389987108), (0, 13.97))
            ThreePointArc((0, 13.97), (9.0780735964, 10.6183557945), (13.8001739979, 2.1716578064))
            ThreePointArc((13.8001739979, 2.1716578064), (14.9756604504, 5.9814851318), (17.1794728138, 9.3040991203))
        make_face()
        with BuildLine():
            ThreePointArc((28.1875230343, -10.9825146808), (29.9449474712, -10.7453830336), (31.6414161677, -10.2288890535))
            ThreePointArc((31.6414161677, -10.2288890535), (25.5373775383, -6.1397943205), (18.2026501198, -5.713464612))
            ThreePointArc((18.2026501198, -5.713464612), (19.2430531898, -7.149547312), (20.5007322161, -8.3997535096))
            ThreePointArc((20.5007322161, -8.3997535096), (24.5908538598, -8.956829671), (28.1875230343, -10.9825146808))
        make_face()
        with BuildLine():
            ThreePointArc((17.0468390827, -9.1533791368), (23.1508777121, -13.2424738699), (30.4856051307, -13.6688035784))
            ThreePointArc((30.4856051307, -13.6688035784), (29.4452020606, -12.2327208784), (28.1875230343, -10.9825146808))
            ThreePointArc((28.1875230343, -10.9825146808), (24.0974013906, -10.4254385194), (20.5007322161, -8.3997535096))
            ThreePointArc((20.5007322161, -8.3997535096), (18.7433077792, -8.6368851567), (17.0468390827, -9.1533791368))
        make_face()
        with BuildLine():
            ThreePointArc((20.5007322161, -8.3997535096), (19.2430531898, -7.149547312), (18.2026501198, -5.713464612))
            ThreePointArc((18.2026501198, -5.713464612), (16.7353010341, -6.1076412996), (15.3194373733, -6.6588388088))
            ThreePointArc((15.3194373733, -6.6588388088), (16.1152114383, -7.9531464375), (17.0468390827, -9.1533791368))
            ThreePointArc((17.0468390827, -9.1533791368), (18.7433077792, -8.6368851567), (20.5007322161, -8.3997535096))
        make_face()
        with BuildLine():
            ThreePointArc((15.3194373733, -6.6588388088), (9.8360544956, -11.1023702751), (7.2245709678, -17.6592455566))
            ThreePointArc((7.2245709678, -17.6592455566), (8.7417158778, -18.7191643403), (10.1054399692, -19.9703290409))
            ThreePointArc((10.1054399692, -19.9703290409), (11.8316523038, -13.442390454), (17.0468390827, -9.1533791368))
            ThreePointArc((17.0468390827, -9.1533791368), (16.1152114383, -7.9531464375), (15.3194373733, -6.6588388088))
        make_face()
        with BuildLine():
            ThreePointArc((20.5007322161, -8.3997535096), (24.0974013906, -10.4254385194), (28.1875230343, -10.9825146808))
            ThreePointArc((28.1875230343, -10.9825146808), (24.5908538598, -8.956829671), (20.5007322161, -8.3997535096))
        make_face()
        with BuildLine():
            ThreePointArc((13.8001739979, -2.1716578064), (13.6303479958, 0), (13.8001739979, 2.1716578064))
            ThreePointArc((13.8001739979, 2.1716578064), (9.0780735964, 10.6183557945), (0, 13.97))
            ThreePointArc((0, 13.97), (-10.6183557945, -9.0780735964), (13.8001739979, -2.1716578064))
        make_face()
        Circle(F0_R, mode=Mode.SUBTRACT)
    extrude(amount=F1_DEPTH)


solid = f1.part
